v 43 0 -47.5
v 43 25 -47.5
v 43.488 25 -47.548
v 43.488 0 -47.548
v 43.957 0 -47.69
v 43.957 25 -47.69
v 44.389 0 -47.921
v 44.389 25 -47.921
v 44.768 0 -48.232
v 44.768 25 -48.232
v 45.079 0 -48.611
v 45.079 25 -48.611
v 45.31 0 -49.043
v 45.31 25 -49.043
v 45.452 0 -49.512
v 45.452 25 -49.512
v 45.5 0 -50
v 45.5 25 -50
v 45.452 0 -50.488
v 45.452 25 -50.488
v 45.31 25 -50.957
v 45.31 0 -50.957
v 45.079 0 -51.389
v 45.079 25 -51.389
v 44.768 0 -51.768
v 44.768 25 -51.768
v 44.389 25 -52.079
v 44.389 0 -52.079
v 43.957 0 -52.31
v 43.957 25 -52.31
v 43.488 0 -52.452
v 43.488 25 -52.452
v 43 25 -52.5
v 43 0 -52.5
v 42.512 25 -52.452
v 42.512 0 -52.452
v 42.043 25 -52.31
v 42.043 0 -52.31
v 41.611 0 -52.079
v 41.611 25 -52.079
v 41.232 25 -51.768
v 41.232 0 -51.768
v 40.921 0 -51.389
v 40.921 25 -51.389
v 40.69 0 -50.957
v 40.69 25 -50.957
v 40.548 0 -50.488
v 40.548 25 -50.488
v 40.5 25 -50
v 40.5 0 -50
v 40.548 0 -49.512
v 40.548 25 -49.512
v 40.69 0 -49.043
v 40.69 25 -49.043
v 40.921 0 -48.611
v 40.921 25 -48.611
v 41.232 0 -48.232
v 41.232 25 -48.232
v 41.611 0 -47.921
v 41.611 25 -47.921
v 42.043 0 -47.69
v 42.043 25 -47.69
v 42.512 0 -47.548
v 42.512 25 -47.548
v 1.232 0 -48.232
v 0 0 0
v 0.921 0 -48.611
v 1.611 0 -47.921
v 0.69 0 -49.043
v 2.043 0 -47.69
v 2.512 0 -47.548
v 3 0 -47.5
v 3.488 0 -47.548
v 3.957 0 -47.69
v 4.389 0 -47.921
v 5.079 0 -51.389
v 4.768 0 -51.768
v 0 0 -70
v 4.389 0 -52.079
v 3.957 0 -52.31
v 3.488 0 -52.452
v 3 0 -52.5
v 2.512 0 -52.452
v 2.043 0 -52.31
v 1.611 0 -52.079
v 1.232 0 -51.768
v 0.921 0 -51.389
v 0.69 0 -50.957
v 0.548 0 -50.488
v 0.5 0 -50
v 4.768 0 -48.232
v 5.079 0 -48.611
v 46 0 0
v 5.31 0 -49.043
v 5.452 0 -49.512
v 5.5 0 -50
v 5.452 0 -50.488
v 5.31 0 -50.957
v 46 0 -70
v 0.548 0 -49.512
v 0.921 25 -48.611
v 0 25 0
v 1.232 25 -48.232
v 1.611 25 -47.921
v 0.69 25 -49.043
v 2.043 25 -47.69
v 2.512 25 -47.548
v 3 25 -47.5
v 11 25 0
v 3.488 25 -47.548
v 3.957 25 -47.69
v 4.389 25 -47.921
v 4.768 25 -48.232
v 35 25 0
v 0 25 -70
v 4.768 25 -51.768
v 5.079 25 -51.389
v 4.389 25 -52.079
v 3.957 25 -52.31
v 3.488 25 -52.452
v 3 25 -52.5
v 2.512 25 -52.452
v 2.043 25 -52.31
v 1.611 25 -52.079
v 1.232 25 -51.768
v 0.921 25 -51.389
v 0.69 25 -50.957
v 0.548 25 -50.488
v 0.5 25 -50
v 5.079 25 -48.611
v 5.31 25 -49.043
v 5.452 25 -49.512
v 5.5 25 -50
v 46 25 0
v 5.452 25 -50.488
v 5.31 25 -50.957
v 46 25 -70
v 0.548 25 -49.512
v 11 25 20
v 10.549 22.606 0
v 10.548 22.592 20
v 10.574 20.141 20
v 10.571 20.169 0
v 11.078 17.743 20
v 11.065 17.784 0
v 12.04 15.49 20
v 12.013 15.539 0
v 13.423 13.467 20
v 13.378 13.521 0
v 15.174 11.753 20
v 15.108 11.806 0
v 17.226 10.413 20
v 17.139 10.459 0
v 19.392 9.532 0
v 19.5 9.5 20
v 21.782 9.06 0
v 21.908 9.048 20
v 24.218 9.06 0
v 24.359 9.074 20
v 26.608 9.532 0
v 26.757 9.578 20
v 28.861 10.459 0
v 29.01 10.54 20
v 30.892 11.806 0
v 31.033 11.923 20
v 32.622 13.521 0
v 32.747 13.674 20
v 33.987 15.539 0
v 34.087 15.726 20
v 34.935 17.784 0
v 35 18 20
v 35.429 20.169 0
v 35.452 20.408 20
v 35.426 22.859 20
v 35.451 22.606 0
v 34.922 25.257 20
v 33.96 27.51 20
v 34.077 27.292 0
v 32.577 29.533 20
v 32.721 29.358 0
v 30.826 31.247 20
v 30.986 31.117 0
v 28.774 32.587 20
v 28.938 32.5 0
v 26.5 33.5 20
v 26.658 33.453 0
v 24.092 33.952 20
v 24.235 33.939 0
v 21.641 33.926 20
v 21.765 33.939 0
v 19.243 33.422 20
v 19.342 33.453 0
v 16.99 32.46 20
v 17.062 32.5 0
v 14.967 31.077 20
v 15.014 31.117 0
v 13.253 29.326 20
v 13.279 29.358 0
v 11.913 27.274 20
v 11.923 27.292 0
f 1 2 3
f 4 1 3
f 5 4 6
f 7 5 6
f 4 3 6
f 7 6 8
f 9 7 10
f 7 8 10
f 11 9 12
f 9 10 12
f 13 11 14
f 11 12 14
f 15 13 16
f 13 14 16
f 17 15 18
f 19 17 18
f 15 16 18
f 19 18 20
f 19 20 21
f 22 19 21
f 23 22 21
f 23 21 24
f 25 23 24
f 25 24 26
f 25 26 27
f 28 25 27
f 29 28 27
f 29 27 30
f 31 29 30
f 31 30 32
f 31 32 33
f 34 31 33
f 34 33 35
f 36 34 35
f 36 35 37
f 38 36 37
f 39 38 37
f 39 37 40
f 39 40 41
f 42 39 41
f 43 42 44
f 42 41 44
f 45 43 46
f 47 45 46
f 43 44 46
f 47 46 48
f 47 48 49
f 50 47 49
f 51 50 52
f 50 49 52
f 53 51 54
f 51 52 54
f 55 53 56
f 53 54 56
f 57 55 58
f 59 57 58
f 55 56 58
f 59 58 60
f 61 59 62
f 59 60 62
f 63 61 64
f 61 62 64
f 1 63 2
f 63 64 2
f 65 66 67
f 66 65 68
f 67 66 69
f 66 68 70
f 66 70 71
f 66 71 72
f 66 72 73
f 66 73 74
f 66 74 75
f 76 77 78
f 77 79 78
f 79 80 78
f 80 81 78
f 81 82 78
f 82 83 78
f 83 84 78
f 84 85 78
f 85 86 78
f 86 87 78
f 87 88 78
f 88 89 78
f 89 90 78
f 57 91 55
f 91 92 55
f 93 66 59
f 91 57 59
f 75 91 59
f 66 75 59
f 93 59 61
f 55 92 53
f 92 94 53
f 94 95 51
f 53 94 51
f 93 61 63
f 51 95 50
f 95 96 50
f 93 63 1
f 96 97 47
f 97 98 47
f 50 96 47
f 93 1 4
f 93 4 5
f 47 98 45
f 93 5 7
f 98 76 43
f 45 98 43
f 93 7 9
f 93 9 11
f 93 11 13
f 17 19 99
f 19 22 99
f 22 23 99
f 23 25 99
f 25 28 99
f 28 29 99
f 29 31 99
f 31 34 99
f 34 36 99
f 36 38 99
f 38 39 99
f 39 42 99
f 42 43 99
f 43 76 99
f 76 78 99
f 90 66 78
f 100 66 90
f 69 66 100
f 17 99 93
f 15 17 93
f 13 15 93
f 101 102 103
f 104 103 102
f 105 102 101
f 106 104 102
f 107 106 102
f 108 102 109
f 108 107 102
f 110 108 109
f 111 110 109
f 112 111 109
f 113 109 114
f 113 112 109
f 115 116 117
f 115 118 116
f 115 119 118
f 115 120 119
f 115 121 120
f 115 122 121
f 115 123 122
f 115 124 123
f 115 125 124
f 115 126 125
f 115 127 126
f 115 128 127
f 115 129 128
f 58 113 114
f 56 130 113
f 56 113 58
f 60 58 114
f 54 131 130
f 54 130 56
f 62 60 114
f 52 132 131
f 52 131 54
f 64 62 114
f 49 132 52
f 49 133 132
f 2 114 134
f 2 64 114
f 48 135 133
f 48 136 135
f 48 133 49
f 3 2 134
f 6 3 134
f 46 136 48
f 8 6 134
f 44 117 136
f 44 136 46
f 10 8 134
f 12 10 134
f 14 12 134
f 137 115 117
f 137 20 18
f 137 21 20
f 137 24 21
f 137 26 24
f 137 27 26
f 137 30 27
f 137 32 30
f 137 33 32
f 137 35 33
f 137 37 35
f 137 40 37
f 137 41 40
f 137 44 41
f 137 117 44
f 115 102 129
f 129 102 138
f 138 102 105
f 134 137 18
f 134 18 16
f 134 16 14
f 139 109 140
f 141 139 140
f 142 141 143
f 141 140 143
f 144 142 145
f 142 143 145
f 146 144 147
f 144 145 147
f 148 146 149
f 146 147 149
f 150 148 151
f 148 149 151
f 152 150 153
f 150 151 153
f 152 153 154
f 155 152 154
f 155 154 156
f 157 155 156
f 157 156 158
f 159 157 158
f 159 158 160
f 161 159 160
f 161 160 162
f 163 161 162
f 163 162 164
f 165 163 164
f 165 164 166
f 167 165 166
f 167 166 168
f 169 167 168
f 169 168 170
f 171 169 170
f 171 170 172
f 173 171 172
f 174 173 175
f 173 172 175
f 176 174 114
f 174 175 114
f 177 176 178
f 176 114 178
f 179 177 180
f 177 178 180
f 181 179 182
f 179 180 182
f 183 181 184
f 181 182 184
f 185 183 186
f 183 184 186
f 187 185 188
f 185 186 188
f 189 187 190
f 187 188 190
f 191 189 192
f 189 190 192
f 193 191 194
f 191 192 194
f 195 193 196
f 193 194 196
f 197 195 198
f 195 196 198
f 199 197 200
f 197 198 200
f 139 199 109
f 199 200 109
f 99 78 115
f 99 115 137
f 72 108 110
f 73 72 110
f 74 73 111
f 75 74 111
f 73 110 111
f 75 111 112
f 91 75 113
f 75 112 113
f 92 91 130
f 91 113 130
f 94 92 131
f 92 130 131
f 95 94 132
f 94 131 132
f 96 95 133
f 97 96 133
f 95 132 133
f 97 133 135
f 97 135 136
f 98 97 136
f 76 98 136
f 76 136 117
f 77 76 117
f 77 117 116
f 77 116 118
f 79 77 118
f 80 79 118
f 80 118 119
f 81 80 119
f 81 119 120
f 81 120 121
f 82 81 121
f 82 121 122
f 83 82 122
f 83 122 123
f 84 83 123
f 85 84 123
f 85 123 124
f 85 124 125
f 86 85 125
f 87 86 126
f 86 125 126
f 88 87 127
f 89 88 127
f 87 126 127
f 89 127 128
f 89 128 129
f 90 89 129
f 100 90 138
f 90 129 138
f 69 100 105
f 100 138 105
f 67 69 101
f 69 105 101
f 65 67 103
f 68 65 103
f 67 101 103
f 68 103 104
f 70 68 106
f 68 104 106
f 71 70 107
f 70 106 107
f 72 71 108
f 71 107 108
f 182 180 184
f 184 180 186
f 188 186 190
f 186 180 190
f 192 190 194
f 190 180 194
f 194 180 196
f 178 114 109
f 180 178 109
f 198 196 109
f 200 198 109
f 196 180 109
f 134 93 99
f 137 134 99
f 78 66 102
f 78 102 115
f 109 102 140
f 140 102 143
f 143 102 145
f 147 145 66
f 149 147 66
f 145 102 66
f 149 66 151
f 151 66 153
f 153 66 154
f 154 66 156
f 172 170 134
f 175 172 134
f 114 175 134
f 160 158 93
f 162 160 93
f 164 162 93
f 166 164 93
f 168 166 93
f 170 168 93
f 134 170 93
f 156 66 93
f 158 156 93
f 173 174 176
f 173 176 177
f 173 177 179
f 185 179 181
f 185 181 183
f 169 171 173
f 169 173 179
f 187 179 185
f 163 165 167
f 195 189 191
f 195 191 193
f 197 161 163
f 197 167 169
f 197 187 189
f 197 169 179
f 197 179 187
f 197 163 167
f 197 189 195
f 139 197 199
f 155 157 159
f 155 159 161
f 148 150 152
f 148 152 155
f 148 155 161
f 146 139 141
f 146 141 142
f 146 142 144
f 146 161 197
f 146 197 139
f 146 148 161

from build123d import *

# Parameters (mm, degrees)
SKETCH1_W           = 46
SKETCH1_H           = 70
BOSS_EXTRUDE1_DEPTH = 25
SKETCH2_R           = 12.5
BOSS_EXTRUDE2_DEPTH = 20
CUT_EXTRUDE1_REACH  = 89.413
SKETCH3_R           = 2.5


with BuildPart() as part:
    # Sketch1 → Boss-Extrude1 (new body)
    with BuildSketch(Plane(origin=(0, 0, 0), x_dir=(1, 0, 0), z_dir=(0, 1, 0))):
        with Locations((23, 35)):
            Rectangle(SKETCH1_W, SKETCH1_H)
    extrude(amount=BOSS_EXTRUDE1_DEPTH)

    # Sketch2 → Boss-Extrude2 (add)
    with BuildSketch(Plane.XY):
        with Locations(Location((23, 21.5, 0), (0, 0, 163.739795292))):
            Circle(SKETCH2_R)
    extrude(amount=BOSS_EXTRUDE2_DEPTH)

    # Sketch3 → Cut-Extrude1 (cut, up to next)
    with BuildSketch(Plane(origin=(0, 25, 0), x_dir=(1, 0, 0), z_dir=(0, 1, 0)), mode=Mode.PRIVATE) as cut_extrude1_sk1:
        with Locations(Location((3, 50, 0), (0, 0, 270))):
            Circle(SKETCH3_R)
    cut_extrude1_tool1 = extrude(cut_extrude1_sk1.sketch, amount=-CUT_EXTRUDE1_REACH, mode=Mode.PRIVATE) & part.part
    # Sketch3 → Cut-Extrude1 (cut, up to next)
    with BuildSketch(Plane(origin=(0, 25, 0), x_dir=(1, 0, 0), z_dir=(0, 1, 0)), mode=Mode.PRIVATE) as cut_extrude1_sk2:
        with Locations(Location((43, 50, 0), (0, 0, 270))):
            Circle(SKETCH3_R)
    cut_extrude1_tool2 = extrude(cut_extrude1_sk2.sketch, amount=-CUT_EXTRUDE1_REACH, mode=Mode.PRIVATE) & part.part
    add(cut_extrude1_tool1.solids().sort_by_distance((3, 25, -50))[0], mode=Mode.SUBTRACT)
    add(cut_extrude1_tool2.solids().sort_by_distance((43, 25, -50))[0], mode=Mode.SUBTRACT)


solid = part.part
